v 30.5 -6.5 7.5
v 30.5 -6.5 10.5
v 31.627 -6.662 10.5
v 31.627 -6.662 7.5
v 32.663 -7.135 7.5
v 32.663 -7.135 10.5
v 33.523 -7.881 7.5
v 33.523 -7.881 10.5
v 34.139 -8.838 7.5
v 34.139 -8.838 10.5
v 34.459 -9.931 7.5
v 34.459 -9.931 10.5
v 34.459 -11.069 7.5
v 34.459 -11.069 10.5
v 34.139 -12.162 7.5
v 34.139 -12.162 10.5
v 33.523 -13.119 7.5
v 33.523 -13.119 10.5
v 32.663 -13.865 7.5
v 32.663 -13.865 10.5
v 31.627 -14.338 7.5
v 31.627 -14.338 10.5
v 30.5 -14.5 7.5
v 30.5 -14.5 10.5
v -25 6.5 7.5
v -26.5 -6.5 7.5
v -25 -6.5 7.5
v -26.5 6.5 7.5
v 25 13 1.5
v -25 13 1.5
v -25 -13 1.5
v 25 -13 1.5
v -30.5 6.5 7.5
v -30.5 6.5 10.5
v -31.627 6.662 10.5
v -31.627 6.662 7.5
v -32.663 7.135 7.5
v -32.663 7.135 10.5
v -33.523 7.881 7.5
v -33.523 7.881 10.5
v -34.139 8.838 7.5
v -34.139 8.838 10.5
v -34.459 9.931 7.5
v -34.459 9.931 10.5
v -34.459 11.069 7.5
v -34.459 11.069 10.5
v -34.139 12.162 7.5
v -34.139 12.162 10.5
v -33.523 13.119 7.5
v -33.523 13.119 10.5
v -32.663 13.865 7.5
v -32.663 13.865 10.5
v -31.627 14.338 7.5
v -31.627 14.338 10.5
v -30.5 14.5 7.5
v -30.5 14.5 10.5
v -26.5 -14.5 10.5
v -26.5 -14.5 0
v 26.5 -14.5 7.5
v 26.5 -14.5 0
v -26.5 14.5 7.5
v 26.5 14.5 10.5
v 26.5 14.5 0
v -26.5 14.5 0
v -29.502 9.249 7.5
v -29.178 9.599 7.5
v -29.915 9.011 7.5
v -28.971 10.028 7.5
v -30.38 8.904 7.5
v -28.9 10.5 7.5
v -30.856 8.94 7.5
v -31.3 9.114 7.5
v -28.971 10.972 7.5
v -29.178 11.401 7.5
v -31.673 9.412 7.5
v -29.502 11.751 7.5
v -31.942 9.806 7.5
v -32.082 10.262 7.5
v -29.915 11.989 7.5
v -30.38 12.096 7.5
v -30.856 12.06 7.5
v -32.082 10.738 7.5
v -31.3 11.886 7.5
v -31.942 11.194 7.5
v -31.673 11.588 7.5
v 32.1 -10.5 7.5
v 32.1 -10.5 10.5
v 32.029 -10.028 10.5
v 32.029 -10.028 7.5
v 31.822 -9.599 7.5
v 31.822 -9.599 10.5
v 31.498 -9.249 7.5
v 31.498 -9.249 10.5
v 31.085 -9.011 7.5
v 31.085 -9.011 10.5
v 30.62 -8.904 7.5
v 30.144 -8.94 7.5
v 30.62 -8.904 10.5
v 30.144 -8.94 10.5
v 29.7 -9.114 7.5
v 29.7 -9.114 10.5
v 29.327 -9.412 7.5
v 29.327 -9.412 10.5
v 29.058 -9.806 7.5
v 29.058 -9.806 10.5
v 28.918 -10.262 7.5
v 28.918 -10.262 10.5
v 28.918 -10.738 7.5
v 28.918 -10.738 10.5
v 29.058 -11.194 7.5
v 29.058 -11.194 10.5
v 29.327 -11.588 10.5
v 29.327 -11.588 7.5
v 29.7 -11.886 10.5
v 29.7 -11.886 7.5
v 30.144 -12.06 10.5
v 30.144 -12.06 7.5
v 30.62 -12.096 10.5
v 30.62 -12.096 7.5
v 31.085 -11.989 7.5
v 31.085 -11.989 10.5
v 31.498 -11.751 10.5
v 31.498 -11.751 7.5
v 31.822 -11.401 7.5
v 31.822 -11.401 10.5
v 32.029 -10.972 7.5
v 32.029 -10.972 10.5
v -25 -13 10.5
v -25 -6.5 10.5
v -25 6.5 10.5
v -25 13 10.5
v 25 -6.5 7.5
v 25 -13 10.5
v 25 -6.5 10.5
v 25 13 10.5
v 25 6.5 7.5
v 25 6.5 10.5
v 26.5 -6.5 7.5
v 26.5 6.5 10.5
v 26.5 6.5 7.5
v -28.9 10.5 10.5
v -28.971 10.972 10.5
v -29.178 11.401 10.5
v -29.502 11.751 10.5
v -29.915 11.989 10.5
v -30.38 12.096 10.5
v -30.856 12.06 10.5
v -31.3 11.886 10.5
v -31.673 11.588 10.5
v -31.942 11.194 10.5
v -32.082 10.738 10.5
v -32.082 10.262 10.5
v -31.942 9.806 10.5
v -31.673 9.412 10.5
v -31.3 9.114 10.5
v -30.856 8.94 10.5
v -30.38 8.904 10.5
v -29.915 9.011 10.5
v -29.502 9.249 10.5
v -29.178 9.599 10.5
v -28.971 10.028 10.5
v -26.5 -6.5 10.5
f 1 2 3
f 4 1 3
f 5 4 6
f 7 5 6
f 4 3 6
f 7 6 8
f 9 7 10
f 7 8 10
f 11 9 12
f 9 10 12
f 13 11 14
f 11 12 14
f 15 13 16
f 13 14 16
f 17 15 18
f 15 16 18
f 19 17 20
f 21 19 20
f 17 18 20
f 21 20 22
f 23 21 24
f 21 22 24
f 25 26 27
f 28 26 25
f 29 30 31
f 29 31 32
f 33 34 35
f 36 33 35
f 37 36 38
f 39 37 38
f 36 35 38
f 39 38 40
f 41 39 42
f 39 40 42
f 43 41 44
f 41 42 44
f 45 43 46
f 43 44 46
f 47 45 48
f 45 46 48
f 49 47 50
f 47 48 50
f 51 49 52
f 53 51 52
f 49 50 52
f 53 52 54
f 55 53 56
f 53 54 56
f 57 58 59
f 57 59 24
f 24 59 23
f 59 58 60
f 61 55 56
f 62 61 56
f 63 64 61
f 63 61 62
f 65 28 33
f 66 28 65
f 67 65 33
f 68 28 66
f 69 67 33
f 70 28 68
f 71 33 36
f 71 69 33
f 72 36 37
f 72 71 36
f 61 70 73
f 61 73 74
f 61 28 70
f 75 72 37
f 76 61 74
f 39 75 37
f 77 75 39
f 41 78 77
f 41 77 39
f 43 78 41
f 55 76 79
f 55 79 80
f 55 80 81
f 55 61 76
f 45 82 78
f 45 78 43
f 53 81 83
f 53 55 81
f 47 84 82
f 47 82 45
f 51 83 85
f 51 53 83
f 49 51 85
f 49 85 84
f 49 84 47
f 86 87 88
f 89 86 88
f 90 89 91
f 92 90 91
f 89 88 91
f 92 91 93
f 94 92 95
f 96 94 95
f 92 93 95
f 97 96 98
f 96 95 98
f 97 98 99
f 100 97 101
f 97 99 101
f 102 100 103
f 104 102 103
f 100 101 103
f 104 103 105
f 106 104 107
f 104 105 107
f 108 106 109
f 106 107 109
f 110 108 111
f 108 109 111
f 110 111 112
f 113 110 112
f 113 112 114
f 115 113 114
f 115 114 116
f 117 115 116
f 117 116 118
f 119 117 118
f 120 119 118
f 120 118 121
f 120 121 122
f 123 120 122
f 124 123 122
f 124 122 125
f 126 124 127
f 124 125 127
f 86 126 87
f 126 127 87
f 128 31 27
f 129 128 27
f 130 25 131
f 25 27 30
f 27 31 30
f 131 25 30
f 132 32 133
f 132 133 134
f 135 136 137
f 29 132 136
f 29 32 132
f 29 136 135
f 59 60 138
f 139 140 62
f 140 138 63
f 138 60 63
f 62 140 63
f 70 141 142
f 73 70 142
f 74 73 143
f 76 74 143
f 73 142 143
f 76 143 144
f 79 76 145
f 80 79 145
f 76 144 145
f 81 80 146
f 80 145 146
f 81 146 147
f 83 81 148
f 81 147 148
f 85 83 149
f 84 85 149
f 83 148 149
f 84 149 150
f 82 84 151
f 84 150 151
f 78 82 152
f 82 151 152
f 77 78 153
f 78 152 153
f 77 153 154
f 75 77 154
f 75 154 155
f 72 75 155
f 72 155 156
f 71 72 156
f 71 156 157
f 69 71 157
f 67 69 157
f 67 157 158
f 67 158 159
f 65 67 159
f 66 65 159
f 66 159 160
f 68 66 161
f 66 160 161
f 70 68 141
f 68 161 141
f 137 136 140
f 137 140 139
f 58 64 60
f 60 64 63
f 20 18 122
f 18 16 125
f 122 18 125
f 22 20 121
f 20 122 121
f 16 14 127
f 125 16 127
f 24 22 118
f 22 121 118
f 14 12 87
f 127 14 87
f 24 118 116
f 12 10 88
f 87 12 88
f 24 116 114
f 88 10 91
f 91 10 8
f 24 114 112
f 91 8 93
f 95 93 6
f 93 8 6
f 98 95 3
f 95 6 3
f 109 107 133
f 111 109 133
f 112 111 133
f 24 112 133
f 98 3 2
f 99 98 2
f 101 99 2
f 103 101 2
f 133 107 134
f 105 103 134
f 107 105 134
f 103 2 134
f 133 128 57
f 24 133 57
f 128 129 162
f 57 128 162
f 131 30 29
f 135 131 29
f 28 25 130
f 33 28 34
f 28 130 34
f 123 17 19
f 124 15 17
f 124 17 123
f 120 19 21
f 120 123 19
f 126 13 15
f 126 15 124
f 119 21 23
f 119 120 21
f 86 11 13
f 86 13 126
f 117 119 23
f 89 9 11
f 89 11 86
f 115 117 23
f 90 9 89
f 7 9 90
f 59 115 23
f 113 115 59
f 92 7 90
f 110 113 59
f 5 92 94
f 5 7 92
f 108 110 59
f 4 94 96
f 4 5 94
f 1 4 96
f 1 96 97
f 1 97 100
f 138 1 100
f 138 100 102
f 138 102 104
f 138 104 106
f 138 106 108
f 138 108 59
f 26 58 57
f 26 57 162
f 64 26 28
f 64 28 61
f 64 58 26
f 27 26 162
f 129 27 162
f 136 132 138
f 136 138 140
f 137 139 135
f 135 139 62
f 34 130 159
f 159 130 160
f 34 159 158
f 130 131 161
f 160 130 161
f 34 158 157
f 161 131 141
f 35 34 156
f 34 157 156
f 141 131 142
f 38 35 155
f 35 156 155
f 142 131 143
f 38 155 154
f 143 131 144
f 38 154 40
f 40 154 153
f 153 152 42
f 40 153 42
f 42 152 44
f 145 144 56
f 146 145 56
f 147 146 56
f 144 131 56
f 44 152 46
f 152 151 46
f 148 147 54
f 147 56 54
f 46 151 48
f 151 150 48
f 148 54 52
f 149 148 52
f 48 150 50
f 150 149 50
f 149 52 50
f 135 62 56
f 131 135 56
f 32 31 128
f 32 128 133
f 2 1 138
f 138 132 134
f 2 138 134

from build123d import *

# Parameters (mm, degrees)
SKETCH_1_W          = 53
SKETCH_1_H          = 29
EXTRUDE_1_DEPTH     = 10.5
SHELL_1_T           = -1.5
SKETCH_3_R          = 1.6
EXTRUDE_2_DEPTH     = 3
SKETCH_4_W          = 3
SKETCH_4_H          = 13
CUT_EXTRUDE_1_DEPTH = 53


with BuildPart() as part:
    # 草图1 → 凸台-拉伸1 (new body)
    with BuildSketch(Plane.XY):
        Rectangle(SKETCH_1_W, SKETCH_1_H)
    extrude(amount=EXTRUDE_1_DEPTH)

    # 抽壳1
    shell_1_openings = [part.faces().sort_by_distance(p)[0] for p in [
        (0, 0, 10.5),
    ]]
    offset(amount=SHELL_1_T, openings=shell_1_openings, kind=Kind.INTERSECTION)

    # 草图3 → 凸台-拉伸2 (add)
    # profile 1 of 2: a face of its own
    with BuildSketch(Plane.XY.offset(10.5)):
        with BuildLine():
            Line((-26.5, 6.5), (-30.5, 6.5))
            ThreePointArc((-30.5, 6.5), (-34.5, 10.5), (-30.5, 14.5))
            Line((-30.5, 14.5), (-26.5, 14.5))
            Line((-26.5, 14.5), (-26.5, 6.5))
        make_face()
        with Locations((-30.5, 10.5)):
            Circle(SKETCH_3_R, mode=Mode.SUBTRACT)
    # profile 2 of 2: a face of its own
    with BuildSketch(Plane.XY.offset(10.5)):
        with BuildLine():
            Line((26.5, -6.5), (30.5, -6.5))
            ThreePointArc((30.5, -6.5), (34.5, -10.5), (30.5, -14.5))
            Line((30.5, -14.5), (26.5, -14.5))
            Line((26.5, -14.5), (26.5, -6.5))
        make_face()
        with Locations((30.5, -10.5)):
            Circle(SKETCH_3_R, mode=Mode.SUBTRACT)
    extrude(amount=-EXTRUDE_2_DEPTH)

    # 草图4 → 切除-拉伸1 (cut)
    with BuildSketch(Plane.ZY.offset(26.5)):
        with Locations((9, 0)):
            Rectangle(SKETCH_4_W, SKETCH_4_H)
    extrude(amount=-CUT_EXTRUDE_1_DEPTH, mode=Mode.SUBTRACT)


solid = part.part
